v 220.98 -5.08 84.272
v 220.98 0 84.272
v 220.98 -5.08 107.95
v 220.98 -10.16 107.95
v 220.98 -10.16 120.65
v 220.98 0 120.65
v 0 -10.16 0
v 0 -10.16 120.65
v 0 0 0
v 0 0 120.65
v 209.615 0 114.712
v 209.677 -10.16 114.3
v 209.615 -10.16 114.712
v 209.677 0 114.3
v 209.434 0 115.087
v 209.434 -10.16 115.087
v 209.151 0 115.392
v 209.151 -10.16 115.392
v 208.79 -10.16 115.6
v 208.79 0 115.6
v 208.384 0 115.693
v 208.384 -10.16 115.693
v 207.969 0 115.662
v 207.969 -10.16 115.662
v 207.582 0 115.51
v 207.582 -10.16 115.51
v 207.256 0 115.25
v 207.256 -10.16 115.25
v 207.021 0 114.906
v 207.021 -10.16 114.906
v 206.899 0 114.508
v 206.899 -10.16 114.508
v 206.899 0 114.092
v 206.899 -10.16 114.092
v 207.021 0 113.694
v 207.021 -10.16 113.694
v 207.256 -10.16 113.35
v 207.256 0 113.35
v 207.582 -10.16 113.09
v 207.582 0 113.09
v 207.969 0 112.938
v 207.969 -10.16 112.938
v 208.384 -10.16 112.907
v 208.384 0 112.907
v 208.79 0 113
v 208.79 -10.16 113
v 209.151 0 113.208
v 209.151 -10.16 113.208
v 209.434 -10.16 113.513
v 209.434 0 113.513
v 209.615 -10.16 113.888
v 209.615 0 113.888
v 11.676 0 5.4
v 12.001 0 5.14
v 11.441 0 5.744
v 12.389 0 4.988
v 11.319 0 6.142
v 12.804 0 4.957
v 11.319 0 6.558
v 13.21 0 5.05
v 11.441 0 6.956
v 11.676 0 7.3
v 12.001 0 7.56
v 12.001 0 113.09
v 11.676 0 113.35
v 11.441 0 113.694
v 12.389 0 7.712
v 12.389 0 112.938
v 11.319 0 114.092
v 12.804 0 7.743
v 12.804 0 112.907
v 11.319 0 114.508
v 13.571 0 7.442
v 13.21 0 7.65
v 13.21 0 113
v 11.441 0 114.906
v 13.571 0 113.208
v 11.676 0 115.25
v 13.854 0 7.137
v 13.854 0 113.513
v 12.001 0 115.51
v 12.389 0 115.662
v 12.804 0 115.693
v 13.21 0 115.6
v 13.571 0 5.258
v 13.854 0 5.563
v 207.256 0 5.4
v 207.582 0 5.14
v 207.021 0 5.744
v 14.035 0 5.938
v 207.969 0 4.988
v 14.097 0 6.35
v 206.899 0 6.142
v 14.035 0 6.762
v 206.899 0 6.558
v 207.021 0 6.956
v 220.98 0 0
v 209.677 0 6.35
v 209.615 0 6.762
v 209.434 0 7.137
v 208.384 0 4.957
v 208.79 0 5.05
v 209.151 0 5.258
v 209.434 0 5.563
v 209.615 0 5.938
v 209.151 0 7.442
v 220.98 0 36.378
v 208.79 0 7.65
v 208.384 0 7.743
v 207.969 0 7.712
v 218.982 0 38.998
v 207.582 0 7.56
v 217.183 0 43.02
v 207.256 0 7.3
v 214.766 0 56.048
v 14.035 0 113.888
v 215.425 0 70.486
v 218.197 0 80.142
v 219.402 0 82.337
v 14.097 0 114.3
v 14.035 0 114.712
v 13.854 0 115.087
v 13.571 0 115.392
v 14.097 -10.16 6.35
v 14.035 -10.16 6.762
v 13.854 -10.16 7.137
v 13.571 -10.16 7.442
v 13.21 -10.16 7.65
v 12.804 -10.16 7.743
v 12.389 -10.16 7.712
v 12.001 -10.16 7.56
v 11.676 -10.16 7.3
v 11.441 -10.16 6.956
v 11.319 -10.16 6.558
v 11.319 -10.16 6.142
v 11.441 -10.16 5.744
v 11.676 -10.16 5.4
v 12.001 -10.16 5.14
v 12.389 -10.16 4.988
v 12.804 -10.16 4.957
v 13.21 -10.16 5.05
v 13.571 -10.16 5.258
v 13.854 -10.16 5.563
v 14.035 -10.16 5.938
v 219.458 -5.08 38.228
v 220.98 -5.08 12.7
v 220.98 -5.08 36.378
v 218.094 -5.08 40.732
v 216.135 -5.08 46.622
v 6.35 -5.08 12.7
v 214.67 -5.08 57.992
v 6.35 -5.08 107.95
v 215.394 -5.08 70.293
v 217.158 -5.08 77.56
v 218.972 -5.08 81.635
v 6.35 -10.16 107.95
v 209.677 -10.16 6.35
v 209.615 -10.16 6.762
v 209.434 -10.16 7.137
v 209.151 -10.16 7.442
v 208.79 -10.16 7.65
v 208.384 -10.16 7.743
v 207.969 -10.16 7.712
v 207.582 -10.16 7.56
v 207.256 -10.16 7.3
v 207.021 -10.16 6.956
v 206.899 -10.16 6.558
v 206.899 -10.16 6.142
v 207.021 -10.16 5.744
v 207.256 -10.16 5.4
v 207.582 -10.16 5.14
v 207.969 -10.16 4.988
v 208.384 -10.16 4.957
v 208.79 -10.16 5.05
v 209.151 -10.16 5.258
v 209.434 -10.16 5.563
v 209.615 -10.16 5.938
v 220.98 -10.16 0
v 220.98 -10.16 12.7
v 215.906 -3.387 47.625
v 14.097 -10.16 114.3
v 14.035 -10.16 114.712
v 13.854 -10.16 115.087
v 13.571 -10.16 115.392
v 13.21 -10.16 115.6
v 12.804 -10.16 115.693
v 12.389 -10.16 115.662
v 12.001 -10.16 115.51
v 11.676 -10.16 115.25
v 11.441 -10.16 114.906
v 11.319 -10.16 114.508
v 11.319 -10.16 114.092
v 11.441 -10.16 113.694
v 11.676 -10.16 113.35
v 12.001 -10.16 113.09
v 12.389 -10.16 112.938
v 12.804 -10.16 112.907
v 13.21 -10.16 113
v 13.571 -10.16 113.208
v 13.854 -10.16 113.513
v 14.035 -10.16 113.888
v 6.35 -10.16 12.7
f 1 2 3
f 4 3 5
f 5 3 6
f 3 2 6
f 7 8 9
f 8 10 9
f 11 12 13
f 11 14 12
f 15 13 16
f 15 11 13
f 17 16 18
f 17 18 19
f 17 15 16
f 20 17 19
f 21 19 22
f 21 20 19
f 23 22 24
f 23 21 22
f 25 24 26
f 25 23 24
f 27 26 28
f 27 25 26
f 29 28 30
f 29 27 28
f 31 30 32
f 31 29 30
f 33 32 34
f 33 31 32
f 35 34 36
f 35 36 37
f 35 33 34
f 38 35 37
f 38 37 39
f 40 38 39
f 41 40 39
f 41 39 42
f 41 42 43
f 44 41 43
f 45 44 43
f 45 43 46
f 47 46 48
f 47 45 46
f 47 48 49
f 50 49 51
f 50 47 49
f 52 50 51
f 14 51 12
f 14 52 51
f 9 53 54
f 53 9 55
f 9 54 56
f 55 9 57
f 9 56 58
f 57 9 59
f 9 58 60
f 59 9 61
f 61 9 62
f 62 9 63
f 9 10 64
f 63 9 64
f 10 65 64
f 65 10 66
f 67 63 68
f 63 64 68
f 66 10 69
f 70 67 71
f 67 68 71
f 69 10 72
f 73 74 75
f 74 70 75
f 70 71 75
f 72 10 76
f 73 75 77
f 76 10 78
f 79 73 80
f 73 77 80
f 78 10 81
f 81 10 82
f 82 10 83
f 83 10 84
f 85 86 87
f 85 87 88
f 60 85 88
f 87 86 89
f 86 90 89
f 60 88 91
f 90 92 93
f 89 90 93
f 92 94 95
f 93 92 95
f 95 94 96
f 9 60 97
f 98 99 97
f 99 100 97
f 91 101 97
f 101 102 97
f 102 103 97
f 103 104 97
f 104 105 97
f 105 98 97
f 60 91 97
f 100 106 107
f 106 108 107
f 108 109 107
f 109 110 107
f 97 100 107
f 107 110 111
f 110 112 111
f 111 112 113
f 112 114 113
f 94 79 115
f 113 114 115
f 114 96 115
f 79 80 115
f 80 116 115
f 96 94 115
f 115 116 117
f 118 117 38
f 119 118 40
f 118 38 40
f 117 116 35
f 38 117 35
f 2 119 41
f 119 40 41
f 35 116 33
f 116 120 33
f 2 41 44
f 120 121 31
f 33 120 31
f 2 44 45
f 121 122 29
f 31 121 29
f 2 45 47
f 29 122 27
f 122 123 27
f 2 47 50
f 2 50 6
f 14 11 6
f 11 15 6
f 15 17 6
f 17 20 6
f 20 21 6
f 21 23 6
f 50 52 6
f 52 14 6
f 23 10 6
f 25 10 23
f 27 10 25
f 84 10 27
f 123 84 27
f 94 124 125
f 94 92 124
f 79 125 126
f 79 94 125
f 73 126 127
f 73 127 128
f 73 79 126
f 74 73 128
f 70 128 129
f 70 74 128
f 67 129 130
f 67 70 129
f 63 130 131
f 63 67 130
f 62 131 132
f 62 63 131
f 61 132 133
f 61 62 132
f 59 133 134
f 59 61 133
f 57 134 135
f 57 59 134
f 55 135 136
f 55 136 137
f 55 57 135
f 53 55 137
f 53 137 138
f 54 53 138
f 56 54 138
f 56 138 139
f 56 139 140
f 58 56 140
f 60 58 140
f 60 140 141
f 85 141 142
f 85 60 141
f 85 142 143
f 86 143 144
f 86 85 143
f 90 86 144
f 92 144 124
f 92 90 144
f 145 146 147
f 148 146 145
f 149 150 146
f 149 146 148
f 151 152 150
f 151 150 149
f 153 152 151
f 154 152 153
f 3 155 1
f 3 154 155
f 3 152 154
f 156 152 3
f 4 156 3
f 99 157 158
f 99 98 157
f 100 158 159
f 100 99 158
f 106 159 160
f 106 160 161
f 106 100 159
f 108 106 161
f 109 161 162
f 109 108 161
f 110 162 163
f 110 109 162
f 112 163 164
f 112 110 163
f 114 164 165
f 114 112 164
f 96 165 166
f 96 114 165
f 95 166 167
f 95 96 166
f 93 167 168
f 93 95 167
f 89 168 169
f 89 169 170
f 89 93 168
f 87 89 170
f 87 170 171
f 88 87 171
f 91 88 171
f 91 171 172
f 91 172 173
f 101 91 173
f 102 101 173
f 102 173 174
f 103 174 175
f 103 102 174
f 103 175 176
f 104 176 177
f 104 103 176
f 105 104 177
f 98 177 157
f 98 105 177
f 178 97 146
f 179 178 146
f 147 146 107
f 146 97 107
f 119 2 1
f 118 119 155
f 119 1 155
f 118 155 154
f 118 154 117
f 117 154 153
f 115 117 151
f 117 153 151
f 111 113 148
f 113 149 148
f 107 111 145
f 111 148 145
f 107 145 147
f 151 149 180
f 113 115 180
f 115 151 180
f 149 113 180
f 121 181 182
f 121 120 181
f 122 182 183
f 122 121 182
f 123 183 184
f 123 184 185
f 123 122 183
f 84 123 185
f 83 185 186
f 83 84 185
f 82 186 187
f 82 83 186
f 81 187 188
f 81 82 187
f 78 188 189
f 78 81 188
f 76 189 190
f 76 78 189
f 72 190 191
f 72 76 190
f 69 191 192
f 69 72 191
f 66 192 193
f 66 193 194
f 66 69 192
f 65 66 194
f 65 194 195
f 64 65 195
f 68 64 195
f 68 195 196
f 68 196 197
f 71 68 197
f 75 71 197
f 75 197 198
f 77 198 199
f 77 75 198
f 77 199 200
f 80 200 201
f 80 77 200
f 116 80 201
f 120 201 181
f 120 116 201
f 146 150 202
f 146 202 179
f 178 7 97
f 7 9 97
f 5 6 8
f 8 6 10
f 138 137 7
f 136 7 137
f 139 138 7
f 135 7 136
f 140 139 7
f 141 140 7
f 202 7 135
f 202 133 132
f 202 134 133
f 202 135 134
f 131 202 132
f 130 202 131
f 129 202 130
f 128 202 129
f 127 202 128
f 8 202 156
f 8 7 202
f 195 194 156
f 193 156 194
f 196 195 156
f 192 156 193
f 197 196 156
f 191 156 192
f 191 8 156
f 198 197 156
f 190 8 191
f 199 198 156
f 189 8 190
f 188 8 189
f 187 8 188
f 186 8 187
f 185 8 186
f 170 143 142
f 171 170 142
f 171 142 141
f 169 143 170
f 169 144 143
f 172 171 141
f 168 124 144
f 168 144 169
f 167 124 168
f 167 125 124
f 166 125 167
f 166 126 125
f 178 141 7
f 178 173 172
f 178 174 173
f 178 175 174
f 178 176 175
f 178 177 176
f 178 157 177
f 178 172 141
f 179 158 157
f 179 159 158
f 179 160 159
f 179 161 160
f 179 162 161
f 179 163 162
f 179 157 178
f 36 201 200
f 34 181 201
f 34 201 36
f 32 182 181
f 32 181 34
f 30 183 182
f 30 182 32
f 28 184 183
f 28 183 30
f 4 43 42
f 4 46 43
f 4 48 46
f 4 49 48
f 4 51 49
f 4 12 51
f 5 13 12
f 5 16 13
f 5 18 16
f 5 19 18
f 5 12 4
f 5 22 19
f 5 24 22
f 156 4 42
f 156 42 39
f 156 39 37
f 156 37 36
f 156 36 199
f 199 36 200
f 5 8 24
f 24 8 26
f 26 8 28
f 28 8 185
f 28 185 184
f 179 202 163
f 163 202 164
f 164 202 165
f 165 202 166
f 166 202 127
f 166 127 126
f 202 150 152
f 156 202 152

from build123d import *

# Parameters (mm, degrees)
F0_W     = 220.98
F0_H     = 120.65
F0_R     = 1.397
F1_DEPTH = 5.08
F2_W     = 214.63
F2_H     = 12.7
F2_R     = 1.397
F2_W_2   = 6.35
F2_H_2   = 95.25
F3_DEPTH = 5.08
F5_DEPTH = 25.4


# Not quite as in the source:
# - a feature names something its author has since deleted; it is built from what else it names


with BuildPart() as f1:
    # F0 (on Front) → F1 (new body)
    with BuildSketch(Plane.XZ):
        with Locations((110.49, 60.325)):
            Rectangle(F0_W, F0_H)
        with Locations((12.7, 6.35)):
            Circle(F0_R, mode=Mode.SUBTRACT)
        with Locations((208.28, 6.35)):
            Circle(F0_R, mode=Mode.SUBTRACT)
        with Locations((12.7, 114.3)):
            Circle(F0_R, mode=Mode.SUBTRACT)
        with Locations((208.28, 114.3)):
            Circle(F0_R, mode=Mode.SUBTRACT)
    extrude(amount=F1_DEPTH)

    # F2 (on face) → F3 (join)
    with BuildSketch(Plane.XZ.offset(5.08)):
        with Locations((113.665, 114.3)):
            Rectangle(F2_W, F2_H)
        with Locations((12.7, 114.3)):
            Circle(F2_R, mode=Mode.SUBTRACT)
        with Locations((208.28, 114.3)):
            Circle(F2_R, mode=Mode.SUBTRACT)
        with Locations((113.665, 6.35)):
            Rectangle(F2_W, F2_H)
        with Locations((12.7, 6.35)):
            Circle(F2_R, mode=Mode.SUBTRACT)
        with Locations((208.28, 6.35)):
            Circle(F2_R, mode=Mode.SUBTRACT)
        with Locations((3.175, 60.325)):
            Rectangle(F2_W_2, F2_H_2)
        with Locations((3.175, 114.3)):
            Rectangle(F2_W_2, F2_H)
        with Locations((3.175, 6.35)):
            Rectangle(F2_W_2, F2_H)
    extrude(amount=F3_DEPTH)

    # F4 (on face) → F5 (cut)
    with BuildSketch(Plane.XZ.offset(5.08)):
        with BuildLine():
            add(Edge.make_bspline(
                [(224.155, 85.725), (207.6572160579, 85.725), (215.906108029, 47.625), (224.155, 9.525), (232.403891971, 47.625), (240.6527839421, 85.725), (224.155, 85.725)],
                knots=[0, 0, 0, 2.0943951024, 2.0943951024, 4.1887902048, 4.1887902048, 6.2831853072, 6.2831853072, 6.2831853072], degree=2, weights=[1, 0.5, 1, 0.5, 1, 0.5, 1]))
        make_face()
    extrude(amount=-F5_DEPTH, mode=Mode.SUBTRACT)


solid = f1.part
